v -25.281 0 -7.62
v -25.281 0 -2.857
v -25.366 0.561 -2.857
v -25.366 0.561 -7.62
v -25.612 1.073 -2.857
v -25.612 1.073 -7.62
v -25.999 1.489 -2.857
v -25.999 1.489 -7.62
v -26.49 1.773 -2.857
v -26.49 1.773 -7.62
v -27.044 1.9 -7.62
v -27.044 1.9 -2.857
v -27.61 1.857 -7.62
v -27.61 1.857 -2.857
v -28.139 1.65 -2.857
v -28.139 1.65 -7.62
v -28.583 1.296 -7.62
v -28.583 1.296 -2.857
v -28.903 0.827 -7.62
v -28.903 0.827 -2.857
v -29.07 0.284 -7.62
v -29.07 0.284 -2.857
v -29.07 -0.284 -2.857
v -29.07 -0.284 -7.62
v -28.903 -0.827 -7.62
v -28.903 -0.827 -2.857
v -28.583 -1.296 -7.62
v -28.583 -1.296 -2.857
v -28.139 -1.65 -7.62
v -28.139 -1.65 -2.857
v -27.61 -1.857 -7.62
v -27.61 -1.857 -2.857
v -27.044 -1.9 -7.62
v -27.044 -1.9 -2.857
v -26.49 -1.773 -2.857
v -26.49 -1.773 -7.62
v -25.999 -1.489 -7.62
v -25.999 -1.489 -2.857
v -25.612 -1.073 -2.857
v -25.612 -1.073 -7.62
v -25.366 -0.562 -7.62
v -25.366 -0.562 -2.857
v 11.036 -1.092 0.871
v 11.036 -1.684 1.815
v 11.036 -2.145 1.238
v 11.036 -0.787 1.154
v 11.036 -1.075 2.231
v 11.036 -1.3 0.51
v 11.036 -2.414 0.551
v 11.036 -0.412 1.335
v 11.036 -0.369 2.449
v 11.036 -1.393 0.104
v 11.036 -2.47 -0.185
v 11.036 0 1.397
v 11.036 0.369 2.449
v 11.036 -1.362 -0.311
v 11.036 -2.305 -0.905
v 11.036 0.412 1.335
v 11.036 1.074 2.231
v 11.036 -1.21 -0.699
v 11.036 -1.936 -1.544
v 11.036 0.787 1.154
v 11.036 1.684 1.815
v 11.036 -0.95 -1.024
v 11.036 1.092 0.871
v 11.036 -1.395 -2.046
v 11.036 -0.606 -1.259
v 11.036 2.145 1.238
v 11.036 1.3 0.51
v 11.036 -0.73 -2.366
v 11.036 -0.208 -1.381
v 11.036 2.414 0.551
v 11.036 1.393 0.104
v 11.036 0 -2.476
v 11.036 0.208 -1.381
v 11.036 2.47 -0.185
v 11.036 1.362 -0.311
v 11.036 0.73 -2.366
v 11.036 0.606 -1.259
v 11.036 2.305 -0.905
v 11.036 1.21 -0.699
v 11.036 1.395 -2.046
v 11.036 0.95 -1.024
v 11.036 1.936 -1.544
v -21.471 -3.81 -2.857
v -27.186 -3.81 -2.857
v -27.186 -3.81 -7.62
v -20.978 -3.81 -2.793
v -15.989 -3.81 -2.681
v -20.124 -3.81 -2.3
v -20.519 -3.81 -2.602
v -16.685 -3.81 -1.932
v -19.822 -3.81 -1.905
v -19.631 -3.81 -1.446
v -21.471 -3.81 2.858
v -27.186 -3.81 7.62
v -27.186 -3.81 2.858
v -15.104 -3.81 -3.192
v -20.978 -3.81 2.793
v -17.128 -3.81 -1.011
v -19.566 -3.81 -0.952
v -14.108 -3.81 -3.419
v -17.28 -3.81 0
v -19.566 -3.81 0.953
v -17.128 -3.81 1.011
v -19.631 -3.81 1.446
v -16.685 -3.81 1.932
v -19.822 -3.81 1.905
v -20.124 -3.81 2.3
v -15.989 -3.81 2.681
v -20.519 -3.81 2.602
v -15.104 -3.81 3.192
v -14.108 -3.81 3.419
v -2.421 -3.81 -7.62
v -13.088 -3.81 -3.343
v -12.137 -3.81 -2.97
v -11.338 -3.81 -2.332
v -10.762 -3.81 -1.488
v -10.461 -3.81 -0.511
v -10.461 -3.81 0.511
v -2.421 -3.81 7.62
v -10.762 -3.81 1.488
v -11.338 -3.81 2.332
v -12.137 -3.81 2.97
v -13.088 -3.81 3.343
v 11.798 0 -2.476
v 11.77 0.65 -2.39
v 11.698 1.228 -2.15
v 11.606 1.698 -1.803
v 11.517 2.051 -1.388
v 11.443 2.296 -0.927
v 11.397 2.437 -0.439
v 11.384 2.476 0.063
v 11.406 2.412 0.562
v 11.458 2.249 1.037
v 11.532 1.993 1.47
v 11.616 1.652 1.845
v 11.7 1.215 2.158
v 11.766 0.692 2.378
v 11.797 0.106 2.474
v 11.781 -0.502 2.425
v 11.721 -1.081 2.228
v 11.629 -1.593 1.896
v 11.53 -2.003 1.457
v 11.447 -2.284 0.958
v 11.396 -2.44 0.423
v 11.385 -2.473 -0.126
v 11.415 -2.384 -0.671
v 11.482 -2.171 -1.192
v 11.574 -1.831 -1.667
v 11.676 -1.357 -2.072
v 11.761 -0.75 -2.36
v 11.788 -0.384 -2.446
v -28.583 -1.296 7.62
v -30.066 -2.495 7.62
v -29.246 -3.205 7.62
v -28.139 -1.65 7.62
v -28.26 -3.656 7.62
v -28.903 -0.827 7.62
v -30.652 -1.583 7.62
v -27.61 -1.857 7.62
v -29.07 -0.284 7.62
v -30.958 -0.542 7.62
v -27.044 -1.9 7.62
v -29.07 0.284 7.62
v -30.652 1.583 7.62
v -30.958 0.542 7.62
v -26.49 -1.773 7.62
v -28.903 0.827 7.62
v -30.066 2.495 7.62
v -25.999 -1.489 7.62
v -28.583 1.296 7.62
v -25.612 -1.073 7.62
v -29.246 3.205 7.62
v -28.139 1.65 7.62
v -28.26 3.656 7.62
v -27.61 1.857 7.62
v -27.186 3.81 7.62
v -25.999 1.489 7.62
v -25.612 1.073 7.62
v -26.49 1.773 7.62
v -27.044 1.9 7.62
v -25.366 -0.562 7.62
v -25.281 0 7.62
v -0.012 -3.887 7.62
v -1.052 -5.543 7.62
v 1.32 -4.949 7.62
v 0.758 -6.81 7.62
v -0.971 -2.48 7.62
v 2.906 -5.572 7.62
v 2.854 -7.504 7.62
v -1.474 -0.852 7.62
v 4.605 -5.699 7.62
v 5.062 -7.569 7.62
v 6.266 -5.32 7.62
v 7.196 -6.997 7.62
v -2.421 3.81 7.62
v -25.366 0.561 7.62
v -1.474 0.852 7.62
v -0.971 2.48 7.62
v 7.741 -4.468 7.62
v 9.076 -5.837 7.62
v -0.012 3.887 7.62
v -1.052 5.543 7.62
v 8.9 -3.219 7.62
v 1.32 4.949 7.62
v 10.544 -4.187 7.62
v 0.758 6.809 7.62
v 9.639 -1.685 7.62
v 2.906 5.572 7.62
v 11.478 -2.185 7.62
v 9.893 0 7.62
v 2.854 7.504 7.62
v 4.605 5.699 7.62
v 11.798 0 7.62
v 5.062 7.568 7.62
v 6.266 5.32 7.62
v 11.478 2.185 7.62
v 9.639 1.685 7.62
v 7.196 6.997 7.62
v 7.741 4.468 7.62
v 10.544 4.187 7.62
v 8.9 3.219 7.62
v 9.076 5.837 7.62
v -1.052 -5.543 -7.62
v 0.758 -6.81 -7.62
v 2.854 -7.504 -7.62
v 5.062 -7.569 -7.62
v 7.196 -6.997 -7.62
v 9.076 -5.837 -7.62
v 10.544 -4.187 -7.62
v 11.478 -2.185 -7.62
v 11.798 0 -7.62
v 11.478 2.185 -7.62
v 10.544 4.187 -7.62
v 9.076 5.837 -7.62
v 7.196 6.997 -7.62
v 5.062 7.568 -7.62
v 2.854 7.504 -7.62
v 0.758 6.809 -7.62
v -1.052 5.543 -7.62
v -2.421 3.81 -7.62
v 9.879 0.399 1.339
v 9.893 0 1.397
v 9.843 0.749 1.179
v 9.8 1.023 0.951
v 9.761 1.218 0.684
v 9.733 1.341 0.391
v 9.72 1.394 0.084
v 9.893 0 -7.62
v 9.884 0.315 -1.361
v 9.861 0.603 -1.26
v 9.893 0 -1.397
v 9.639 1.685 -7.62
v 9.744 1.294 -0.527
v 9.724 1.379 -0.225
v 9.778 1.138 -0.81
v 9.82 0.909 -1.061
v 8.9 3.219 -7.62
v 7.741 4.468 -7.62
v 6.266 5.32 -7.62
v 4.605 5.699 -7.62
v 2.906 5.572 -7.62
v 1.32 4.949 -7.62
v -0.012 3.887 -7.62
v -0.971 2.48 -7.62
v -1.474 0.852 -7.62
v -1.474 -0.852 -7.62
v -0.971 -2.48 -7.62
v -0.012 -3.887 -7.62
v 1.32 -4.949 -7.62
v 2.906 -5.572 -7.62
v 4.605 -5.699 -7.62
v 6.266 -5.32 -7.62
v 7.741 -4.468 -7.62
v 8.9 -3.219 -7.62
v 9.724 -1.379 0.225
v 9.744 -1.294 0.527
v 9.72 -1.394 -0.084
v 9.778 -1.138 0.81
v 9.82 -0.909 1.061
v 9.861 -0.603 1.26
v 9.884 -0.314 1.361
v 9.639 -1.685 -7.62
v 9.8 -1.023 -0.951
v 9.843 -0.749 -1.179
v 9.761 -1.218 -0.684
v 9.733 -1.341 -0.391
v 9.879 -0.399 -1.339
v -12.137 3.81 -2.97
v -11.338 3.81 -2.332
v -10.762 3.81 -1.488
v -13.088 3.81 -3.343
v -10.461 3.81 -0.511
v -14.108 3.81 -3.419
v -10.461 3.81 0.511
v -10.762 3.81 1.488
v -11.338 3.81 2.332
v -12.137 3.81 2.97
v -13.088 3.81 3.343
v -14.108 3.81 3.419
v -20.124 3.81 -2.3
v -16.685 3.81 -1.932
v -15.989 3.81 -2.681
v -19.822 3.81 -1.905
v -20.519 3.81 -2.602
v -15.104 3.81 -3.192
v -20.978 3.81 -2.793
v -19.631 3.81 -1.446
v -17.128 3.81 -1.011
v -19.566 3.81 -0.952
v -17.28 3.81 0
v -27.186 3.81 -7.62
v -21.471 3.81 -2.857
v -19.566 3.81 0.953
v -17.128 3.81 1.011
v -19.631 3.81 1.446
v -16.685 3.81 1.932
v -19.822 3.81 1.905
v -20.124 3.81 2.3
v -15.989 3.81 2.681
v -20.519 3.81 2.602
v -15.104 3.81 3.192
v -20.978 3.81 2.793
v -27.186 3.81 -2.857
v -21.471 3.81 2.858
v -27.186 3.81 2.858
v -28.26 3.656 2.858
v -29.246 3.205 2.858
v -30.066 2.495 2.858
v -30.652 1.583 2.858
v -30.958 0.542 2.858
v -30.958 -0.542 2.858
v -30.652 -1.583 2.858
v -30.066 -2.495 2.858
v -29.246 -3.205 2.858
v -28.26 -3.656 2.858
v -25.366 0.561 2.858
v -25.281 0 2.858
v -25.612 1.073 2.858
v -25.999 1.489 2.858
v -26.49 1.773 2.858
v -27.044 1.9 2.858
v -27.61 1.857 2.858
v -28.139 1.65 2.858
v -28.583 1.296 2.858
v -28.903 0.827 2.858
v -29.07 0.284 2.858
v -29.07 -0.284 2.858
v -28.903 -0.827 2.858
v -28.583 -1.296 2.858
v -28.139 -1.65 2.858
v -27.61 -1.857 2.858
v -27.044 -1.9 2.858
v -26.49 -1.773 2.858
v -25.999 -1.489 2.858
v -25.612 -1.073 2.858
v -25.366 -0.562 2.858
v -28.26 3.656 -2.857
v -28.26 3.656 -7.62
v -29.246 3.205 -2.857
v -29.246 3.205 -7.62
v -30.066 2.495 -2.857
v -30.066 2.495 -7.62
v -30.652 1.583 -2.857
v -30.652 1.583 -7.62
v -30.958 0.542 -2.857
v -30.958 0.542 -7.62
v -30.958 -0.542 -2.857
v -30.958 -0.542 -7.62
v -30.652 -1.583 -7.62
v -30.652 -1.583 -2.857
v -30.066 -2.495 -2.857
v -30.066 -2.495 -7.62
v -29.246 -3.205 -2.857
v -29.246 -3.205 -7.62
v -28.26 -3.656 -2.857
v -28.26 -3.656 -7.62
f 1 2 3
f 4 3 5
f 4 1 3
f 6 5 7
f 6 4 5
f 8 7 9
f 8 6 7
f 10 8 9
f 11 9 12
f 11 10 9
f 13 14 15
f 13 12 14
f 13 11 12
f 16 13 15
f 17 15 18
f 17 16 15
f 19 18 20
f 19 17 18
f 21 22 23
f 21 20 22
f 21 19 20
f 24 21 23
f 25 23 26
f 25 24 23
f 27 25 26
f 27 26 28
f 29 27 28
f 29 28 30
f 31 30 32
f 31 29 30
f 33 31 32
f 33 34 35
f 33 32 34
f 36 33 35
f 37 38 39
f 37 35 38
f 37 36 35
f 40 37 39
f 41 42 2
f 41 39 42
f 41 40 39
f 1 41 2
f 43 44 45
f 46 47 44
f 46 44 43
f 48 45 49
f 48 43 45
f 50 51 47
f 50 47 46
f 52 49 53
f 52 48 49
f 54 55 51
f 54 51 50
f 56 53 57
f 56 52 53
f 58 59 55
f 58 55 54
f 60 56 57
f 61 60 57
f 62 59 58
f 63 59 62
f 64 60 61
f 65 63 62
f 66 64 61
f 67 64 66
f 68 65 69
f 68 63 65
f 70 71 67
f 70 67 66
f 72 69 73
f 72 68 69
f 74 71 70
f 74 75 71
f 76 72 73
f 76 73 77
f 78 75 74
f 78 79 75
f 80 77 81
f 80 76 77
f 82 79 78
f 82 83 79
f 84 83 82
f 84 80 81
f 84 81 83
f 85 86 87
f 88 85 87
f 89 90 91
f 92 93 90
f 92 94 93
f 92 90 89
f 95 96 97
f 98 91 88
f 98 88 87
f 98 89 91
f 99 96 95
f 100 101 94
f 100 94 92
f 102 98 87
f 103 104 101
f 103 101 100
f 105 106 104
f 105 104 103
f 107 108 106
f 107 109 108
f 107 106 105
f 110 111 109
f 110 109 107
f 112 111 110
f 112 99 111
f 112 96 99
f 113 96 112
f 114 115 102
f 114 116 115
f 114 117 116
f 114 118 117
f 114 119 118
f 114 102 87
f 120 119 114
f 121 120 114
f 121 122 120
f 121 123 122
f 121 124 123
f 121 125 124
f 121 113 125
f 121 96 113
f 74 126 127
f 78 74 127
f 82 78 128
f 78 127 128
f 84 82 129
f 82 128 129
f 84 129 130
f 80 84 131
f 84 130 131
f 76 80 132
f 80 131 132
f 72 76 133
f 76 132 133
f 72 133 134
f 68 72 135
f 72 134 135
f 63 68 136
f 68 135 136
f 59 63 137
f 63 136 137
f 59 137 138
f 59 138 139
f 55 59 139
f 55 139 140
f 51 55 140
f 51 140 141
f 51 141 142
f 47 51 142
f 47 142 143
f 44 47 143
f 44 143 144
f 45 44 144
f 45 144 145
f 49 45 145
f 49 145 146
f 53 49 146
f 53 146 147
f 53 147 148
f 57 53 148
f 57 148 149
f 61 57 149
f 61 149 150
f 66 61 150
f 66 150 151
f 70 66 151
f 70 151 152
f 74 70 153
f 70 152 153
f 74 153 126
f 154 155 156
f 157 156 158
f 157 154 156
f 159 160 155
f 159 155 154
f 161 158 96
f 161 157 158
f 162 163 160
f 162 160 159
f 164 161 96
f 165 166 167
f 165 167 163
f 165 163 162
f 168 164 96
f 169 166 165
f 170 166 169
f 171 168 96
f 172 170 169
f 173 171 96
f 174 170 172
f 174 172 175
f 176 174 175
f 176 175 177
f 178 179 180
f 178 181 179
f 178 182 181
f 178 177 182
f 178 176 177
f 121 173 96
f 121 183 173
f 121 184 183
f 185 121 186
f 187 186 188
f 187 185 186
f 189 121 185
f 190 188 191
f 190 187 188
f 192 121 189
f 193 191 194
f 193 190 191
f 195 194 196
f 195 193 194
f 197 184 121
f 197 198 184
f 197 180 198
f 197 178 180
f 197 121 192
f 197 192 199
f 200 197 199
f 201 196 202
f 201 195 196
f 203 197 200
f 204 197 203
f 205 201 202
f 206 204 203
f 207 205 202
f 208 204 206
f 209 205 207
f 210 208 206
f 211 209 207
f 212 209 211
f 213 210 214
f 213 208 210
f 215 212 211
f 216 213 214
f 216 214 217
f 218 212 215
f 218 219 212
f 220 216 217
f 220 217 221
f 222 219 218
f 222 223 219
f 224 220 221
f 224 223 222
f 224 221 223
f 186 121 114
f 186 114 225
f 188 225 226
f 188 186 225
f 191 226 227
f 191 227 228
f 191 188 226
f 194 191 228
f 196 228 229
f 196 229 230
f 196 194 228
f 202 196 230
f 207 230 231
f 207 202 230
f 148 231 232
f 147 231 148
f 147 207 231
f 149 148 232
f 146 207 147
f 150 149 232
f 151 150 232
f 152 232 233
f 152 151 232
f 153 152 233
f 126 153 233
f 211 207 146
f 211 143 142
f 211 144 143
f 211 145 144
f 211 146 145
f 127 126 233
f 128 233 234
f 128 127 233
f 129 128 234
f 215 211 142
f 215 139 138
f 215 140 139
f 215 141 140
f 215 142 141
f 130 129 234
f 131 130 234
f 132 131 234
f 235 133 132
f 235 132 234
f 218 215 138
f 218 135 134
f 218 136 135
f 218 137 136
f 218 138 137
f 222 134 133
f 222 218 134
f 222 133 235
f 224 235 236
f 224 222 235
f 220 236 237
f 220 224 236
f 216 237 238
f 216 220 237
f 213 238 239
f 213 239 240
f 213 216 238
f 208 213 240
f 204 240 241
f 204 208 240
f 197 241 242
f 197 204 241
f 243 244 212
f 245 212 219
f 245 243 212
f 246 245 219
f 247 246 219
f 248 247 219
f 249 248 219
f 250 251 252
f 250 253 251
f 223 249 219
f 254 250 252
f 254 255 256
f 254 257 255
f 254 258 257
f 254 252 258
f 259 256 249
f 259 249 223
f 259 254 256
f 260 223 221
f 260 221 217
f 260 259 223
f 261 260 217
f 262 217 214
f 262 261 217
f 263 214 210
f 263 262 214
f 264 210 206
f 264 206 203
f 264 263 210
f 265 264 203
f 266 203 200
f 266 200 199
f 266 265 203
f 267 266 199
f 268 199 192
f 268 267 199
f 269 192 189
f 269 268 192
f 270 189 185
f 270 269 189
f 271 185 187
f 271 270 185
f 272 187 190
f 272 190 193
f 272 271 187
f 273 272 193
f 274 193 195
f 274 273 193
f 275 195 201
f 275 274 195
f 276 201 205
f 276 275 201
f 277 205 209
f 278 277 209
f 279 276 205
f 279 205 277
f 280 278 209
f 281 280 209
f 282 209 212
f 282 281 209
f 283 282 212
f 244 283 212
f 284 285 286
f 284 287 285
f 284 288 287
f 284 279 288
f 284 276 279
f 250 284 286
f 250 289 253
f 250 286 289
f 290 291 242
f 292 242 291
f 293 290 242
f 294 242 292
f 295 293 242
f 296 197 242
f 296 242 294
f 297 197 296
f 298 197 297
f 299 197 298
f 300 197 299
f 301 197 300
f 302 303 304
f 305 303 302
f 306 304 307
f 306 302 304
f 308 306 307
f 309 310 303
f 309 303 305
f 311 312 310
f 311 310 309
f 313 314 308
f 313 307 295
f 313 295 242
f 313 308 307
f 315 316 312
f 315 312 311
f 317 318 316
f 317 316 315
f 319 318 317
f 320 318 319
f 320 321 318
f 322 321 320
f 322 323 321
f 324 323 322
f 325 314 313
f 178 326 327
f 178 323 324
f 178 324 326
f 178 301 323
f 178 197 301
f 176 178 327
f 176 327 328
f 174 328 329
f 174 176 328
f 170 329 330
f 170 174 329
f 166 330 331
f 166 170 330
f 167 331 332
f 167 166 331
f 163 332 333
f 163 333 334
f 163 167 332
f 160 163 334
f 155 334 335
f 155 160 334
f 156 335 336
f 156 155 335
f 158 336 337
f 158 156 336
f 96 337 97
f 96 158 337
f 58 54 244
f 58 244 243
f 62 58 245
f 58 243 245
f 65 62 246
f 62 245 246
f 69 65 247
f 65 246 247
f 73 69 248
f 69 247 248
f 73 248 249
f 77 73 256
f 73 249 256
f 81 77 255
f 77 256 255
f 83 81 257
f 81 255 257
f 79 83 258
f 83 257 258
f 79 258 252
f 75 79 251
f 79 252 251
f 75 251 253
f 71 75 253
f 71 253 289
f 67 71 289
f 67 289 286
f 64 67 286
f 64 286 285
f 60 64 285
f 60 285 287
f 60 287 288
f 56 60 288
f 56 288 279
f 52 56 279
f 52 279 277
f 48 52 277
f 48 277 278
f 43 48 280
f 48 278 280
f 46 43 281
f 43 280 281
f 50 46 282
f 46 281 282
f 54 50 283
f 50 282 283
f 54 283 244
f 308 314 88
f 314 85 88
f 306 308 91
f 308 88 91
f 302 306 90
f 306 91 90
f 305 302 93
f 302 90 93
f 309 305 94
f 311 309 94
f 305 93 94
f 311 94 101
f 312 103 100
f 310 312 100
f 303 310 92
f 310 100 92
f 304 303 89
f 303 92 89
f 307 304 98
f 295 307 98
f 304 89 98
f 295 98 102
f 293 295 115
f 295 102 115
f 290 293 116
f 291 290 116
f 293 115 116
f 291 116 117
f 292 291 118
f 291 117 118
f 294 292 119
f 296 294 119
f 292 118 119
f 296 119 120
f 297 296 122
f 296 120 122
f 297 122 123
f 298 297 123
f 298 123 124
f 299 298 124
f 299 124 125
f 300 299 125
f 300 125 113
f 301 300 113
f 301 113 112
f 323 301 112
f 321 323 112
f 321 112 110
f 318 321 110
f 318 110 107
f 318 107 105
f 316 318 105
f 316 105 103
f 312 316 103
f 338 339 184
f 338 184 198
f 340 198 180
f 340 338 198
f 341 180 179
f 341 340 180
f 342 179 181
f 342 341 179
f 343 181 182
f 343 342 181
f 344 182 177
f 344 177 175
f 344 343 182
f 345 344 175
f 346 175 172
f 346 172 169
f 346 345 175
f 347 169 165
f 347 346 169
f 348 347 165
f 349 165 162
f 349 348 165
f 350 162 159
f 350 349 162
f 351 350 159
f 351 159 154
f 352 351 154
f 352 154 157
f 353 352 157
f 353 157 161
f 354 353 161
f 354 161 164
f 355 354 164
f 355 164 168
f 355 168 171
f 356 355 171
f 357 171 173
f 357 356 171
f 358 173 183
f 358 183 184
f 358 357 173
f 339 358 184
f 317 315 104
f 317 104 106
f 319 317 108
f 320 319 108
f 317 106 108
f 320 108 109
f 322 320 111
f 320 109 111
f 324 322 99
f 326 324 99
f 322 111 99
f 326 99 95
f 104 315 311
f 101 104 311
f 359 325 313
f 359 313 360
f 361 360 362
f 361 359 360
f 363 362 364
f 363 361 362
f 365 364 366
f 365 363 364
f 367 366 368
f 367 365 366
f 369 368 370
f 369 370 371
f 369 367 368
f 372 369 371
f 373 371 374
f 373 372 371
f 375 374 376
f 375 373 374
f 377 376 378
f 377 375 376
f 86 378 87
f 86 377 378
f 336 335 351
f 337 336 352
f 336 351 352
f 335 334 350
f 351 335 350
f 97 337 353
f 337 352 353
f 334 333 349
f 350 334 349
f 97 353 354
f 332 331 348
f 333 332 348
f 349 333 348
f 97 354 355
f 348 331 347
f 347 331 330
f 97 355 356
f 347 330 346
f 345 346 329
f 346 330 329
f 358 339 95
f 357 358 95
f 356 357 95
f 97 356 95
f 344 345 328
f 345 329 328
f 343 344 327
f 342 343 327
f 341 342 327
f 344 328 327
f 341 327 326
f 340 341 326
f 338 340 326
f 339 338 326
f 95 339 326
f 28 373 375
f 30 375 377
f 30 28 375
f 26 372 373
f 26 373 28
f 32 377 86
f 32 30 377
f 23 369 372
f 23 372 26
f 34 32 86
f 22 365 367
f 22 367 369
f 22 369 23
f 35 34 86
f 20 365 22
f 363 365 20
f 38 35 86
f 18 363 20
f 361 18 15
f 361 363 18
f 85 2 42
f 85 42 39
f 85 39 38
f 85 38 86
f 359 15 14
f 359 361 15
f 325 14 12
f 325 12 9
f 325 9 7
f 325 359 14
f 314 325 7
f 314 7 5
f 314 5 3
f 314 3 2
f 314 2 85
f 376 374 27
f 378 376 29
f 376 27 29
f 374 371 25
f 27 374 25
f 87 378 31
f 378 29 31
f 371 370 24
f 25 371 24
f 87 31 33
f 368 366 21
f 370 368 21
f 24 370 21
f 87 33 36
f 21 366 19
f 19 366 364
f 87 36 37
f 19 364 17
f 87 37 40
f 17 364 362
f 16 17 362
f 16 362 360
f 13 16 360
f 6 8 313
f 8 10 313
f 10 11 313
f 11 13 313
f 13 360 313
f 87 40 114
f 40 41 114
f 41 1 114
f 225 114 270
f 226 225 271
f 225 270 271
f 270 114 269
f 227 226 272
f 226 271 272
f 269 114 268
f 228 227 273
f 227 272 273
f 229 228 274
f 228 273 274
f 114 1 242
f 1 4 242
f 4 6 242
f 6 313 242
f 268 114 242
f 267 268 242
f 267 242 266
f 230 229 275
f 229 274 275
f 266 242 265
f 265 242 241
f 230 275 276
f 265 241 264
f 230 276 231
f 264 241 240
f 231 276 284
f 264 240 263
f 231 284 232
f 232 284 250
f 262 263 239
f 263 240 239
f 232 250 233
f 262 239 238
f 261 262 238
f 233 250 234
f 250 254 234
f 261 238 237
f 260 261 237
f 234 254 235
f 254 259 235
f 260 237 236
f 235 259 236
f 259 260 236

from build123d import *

# Parameters (mm, degrees)
SKETCH1_R                      = 1.27
SKETCH1_R_2                    = 3.81
BOSS_EXTRUDE1_DEPTH            = 5.08
F_15_0_18_DIAMETER_HOLE1_D     = 4.572
SKETCH5_W                      = 15.24
SKETCH5_H                      = 3.81
CUT_EXTRUDE1_DEPTH             = 5.08
FILLET1_R                      = 1.27
CUT_EXTRUDE3_START             = 5.334
SKETCH8_R                      = 1.651
CUT_EXTRUDE3_DEPTH             = 0.762
SCALE1_SCALE                   = 1.5
F_35_0_11_DIAMETER_HOLE1_D     = 2.794
F_35_0_11_DIAMETER_HOLE1_DEPTH = 6.35
F_35_0_11_DIAMETER_HOLE1_TIP   = 0.839402285


with BuildPart() as part:
    # Sketch1 → Boss-Extrude1 (new, symmetric)
    with BuildSketch(Plane.XY):
        with BuildLine():
            Line((-20.909409051, -2.54), (-4.399409051, -2.54))
            ThreePointArc((-4.399409051, -2.54), (5.08, 0), (-4.399409051, 2.54))
            Line((-4.399409051, 2.54), (-20.909409051, 2.54))
            ThreePointArc((-20.909409051, 2.54), (-23.449409051, 0), (-20.909409051, -2.54))
        make_face()
        with Locations((-20.909409051, 0)):
            Circle(SKETCH1_R, mode=Mode.SUBTRACT)
        Circle(SKETCH1_R_2, mode=Mode.SUBTRACT)
    extrude(amount=BOSS_EXTRUDE1_DEPTH, both=True)

    # #15 (0.18) Diameter Hole1 (through all)
    with Locations(Plane(origin=(0, 2.54, 0), x_dir=(1, 0, 0), z_dir=(0, 1, 0))):
        with Locations((-12.019409051, 0)):
            Hole(F_15_0_18_DIAMETER_HOLE1_D / 2)

    # Sketch5 → Cut-Extrude1 (cut)
    with BuildSketch(Plane(origin=(0, 2.54, 0), x_dir=(1, 0, 0), z_dir=(0, 1, 0))):
        with Locations((-23.449409051, 0)):
            Rectangle(SKETCH5_W, SKETCH5_H)
    extrude(amount=-CUT_EXTRUDE1_DEPTH, mode=Mode.SUBTRACT)

    # Fillet1
    fillet1_edges = [part.edges().sort_by_distance(p)[0] for p in [
        (-15.829409051, 0, 1.905),
        (-15.829409051, 0, -1.905),
    ]]
    fillet(fillet1_edges, radius=FILLET1_R)

    # Sketch8 → Cut-Extrude3 (cut)
    with BuildSketch(Plane(origin=(0, 0, 0), x_dir=(0, 0, -1), z_dir=(1, 0, 0)).offset(CUT_EXTRUDE3_START)):
        Circle(SKETCH8_R)
    extrude(amount=-CUT_EXTRUDE3_DEPTH, mode=Mode.SUBTRACT)


with BuildPart() as part_1:
    # Scale1: scaled about (-8.355295552, 4.7607e-05, -6.308e-06)
    add(part.part.scale(SCALE1_SCALE).moved(Location((4.177647776, -2.3804e-05, 3.154e-06))))

    # #35 (0.11) Diameter Hole1
    with Locations(Plane(origin=(11.035535864, 0, 0), x_dir=(0, 0, -1), z_dir=(1, 0, 0))):
        with Locations((0, 0)):
            Hole(F_35_0_11_DIAMETER_HOLE1_D / 2, depth=F_35_0_11_DIAMETER_HOLE1_DEPTH)
            with Locations((0, 0, -(F_35_0_11_DIAMETER_HOLE1_DEPTH + F_35_0_11_DIAMETER_HOLE1_TIP / 2))):  # 118° drill point
                Cone(0, F_35_0_11_DIAMETER_HOLE1_D / 2, F_35_0_11_DIAMETER_HOLE1_TIP, mode=Mode.SUBTRACT)


solid = part_1.part
